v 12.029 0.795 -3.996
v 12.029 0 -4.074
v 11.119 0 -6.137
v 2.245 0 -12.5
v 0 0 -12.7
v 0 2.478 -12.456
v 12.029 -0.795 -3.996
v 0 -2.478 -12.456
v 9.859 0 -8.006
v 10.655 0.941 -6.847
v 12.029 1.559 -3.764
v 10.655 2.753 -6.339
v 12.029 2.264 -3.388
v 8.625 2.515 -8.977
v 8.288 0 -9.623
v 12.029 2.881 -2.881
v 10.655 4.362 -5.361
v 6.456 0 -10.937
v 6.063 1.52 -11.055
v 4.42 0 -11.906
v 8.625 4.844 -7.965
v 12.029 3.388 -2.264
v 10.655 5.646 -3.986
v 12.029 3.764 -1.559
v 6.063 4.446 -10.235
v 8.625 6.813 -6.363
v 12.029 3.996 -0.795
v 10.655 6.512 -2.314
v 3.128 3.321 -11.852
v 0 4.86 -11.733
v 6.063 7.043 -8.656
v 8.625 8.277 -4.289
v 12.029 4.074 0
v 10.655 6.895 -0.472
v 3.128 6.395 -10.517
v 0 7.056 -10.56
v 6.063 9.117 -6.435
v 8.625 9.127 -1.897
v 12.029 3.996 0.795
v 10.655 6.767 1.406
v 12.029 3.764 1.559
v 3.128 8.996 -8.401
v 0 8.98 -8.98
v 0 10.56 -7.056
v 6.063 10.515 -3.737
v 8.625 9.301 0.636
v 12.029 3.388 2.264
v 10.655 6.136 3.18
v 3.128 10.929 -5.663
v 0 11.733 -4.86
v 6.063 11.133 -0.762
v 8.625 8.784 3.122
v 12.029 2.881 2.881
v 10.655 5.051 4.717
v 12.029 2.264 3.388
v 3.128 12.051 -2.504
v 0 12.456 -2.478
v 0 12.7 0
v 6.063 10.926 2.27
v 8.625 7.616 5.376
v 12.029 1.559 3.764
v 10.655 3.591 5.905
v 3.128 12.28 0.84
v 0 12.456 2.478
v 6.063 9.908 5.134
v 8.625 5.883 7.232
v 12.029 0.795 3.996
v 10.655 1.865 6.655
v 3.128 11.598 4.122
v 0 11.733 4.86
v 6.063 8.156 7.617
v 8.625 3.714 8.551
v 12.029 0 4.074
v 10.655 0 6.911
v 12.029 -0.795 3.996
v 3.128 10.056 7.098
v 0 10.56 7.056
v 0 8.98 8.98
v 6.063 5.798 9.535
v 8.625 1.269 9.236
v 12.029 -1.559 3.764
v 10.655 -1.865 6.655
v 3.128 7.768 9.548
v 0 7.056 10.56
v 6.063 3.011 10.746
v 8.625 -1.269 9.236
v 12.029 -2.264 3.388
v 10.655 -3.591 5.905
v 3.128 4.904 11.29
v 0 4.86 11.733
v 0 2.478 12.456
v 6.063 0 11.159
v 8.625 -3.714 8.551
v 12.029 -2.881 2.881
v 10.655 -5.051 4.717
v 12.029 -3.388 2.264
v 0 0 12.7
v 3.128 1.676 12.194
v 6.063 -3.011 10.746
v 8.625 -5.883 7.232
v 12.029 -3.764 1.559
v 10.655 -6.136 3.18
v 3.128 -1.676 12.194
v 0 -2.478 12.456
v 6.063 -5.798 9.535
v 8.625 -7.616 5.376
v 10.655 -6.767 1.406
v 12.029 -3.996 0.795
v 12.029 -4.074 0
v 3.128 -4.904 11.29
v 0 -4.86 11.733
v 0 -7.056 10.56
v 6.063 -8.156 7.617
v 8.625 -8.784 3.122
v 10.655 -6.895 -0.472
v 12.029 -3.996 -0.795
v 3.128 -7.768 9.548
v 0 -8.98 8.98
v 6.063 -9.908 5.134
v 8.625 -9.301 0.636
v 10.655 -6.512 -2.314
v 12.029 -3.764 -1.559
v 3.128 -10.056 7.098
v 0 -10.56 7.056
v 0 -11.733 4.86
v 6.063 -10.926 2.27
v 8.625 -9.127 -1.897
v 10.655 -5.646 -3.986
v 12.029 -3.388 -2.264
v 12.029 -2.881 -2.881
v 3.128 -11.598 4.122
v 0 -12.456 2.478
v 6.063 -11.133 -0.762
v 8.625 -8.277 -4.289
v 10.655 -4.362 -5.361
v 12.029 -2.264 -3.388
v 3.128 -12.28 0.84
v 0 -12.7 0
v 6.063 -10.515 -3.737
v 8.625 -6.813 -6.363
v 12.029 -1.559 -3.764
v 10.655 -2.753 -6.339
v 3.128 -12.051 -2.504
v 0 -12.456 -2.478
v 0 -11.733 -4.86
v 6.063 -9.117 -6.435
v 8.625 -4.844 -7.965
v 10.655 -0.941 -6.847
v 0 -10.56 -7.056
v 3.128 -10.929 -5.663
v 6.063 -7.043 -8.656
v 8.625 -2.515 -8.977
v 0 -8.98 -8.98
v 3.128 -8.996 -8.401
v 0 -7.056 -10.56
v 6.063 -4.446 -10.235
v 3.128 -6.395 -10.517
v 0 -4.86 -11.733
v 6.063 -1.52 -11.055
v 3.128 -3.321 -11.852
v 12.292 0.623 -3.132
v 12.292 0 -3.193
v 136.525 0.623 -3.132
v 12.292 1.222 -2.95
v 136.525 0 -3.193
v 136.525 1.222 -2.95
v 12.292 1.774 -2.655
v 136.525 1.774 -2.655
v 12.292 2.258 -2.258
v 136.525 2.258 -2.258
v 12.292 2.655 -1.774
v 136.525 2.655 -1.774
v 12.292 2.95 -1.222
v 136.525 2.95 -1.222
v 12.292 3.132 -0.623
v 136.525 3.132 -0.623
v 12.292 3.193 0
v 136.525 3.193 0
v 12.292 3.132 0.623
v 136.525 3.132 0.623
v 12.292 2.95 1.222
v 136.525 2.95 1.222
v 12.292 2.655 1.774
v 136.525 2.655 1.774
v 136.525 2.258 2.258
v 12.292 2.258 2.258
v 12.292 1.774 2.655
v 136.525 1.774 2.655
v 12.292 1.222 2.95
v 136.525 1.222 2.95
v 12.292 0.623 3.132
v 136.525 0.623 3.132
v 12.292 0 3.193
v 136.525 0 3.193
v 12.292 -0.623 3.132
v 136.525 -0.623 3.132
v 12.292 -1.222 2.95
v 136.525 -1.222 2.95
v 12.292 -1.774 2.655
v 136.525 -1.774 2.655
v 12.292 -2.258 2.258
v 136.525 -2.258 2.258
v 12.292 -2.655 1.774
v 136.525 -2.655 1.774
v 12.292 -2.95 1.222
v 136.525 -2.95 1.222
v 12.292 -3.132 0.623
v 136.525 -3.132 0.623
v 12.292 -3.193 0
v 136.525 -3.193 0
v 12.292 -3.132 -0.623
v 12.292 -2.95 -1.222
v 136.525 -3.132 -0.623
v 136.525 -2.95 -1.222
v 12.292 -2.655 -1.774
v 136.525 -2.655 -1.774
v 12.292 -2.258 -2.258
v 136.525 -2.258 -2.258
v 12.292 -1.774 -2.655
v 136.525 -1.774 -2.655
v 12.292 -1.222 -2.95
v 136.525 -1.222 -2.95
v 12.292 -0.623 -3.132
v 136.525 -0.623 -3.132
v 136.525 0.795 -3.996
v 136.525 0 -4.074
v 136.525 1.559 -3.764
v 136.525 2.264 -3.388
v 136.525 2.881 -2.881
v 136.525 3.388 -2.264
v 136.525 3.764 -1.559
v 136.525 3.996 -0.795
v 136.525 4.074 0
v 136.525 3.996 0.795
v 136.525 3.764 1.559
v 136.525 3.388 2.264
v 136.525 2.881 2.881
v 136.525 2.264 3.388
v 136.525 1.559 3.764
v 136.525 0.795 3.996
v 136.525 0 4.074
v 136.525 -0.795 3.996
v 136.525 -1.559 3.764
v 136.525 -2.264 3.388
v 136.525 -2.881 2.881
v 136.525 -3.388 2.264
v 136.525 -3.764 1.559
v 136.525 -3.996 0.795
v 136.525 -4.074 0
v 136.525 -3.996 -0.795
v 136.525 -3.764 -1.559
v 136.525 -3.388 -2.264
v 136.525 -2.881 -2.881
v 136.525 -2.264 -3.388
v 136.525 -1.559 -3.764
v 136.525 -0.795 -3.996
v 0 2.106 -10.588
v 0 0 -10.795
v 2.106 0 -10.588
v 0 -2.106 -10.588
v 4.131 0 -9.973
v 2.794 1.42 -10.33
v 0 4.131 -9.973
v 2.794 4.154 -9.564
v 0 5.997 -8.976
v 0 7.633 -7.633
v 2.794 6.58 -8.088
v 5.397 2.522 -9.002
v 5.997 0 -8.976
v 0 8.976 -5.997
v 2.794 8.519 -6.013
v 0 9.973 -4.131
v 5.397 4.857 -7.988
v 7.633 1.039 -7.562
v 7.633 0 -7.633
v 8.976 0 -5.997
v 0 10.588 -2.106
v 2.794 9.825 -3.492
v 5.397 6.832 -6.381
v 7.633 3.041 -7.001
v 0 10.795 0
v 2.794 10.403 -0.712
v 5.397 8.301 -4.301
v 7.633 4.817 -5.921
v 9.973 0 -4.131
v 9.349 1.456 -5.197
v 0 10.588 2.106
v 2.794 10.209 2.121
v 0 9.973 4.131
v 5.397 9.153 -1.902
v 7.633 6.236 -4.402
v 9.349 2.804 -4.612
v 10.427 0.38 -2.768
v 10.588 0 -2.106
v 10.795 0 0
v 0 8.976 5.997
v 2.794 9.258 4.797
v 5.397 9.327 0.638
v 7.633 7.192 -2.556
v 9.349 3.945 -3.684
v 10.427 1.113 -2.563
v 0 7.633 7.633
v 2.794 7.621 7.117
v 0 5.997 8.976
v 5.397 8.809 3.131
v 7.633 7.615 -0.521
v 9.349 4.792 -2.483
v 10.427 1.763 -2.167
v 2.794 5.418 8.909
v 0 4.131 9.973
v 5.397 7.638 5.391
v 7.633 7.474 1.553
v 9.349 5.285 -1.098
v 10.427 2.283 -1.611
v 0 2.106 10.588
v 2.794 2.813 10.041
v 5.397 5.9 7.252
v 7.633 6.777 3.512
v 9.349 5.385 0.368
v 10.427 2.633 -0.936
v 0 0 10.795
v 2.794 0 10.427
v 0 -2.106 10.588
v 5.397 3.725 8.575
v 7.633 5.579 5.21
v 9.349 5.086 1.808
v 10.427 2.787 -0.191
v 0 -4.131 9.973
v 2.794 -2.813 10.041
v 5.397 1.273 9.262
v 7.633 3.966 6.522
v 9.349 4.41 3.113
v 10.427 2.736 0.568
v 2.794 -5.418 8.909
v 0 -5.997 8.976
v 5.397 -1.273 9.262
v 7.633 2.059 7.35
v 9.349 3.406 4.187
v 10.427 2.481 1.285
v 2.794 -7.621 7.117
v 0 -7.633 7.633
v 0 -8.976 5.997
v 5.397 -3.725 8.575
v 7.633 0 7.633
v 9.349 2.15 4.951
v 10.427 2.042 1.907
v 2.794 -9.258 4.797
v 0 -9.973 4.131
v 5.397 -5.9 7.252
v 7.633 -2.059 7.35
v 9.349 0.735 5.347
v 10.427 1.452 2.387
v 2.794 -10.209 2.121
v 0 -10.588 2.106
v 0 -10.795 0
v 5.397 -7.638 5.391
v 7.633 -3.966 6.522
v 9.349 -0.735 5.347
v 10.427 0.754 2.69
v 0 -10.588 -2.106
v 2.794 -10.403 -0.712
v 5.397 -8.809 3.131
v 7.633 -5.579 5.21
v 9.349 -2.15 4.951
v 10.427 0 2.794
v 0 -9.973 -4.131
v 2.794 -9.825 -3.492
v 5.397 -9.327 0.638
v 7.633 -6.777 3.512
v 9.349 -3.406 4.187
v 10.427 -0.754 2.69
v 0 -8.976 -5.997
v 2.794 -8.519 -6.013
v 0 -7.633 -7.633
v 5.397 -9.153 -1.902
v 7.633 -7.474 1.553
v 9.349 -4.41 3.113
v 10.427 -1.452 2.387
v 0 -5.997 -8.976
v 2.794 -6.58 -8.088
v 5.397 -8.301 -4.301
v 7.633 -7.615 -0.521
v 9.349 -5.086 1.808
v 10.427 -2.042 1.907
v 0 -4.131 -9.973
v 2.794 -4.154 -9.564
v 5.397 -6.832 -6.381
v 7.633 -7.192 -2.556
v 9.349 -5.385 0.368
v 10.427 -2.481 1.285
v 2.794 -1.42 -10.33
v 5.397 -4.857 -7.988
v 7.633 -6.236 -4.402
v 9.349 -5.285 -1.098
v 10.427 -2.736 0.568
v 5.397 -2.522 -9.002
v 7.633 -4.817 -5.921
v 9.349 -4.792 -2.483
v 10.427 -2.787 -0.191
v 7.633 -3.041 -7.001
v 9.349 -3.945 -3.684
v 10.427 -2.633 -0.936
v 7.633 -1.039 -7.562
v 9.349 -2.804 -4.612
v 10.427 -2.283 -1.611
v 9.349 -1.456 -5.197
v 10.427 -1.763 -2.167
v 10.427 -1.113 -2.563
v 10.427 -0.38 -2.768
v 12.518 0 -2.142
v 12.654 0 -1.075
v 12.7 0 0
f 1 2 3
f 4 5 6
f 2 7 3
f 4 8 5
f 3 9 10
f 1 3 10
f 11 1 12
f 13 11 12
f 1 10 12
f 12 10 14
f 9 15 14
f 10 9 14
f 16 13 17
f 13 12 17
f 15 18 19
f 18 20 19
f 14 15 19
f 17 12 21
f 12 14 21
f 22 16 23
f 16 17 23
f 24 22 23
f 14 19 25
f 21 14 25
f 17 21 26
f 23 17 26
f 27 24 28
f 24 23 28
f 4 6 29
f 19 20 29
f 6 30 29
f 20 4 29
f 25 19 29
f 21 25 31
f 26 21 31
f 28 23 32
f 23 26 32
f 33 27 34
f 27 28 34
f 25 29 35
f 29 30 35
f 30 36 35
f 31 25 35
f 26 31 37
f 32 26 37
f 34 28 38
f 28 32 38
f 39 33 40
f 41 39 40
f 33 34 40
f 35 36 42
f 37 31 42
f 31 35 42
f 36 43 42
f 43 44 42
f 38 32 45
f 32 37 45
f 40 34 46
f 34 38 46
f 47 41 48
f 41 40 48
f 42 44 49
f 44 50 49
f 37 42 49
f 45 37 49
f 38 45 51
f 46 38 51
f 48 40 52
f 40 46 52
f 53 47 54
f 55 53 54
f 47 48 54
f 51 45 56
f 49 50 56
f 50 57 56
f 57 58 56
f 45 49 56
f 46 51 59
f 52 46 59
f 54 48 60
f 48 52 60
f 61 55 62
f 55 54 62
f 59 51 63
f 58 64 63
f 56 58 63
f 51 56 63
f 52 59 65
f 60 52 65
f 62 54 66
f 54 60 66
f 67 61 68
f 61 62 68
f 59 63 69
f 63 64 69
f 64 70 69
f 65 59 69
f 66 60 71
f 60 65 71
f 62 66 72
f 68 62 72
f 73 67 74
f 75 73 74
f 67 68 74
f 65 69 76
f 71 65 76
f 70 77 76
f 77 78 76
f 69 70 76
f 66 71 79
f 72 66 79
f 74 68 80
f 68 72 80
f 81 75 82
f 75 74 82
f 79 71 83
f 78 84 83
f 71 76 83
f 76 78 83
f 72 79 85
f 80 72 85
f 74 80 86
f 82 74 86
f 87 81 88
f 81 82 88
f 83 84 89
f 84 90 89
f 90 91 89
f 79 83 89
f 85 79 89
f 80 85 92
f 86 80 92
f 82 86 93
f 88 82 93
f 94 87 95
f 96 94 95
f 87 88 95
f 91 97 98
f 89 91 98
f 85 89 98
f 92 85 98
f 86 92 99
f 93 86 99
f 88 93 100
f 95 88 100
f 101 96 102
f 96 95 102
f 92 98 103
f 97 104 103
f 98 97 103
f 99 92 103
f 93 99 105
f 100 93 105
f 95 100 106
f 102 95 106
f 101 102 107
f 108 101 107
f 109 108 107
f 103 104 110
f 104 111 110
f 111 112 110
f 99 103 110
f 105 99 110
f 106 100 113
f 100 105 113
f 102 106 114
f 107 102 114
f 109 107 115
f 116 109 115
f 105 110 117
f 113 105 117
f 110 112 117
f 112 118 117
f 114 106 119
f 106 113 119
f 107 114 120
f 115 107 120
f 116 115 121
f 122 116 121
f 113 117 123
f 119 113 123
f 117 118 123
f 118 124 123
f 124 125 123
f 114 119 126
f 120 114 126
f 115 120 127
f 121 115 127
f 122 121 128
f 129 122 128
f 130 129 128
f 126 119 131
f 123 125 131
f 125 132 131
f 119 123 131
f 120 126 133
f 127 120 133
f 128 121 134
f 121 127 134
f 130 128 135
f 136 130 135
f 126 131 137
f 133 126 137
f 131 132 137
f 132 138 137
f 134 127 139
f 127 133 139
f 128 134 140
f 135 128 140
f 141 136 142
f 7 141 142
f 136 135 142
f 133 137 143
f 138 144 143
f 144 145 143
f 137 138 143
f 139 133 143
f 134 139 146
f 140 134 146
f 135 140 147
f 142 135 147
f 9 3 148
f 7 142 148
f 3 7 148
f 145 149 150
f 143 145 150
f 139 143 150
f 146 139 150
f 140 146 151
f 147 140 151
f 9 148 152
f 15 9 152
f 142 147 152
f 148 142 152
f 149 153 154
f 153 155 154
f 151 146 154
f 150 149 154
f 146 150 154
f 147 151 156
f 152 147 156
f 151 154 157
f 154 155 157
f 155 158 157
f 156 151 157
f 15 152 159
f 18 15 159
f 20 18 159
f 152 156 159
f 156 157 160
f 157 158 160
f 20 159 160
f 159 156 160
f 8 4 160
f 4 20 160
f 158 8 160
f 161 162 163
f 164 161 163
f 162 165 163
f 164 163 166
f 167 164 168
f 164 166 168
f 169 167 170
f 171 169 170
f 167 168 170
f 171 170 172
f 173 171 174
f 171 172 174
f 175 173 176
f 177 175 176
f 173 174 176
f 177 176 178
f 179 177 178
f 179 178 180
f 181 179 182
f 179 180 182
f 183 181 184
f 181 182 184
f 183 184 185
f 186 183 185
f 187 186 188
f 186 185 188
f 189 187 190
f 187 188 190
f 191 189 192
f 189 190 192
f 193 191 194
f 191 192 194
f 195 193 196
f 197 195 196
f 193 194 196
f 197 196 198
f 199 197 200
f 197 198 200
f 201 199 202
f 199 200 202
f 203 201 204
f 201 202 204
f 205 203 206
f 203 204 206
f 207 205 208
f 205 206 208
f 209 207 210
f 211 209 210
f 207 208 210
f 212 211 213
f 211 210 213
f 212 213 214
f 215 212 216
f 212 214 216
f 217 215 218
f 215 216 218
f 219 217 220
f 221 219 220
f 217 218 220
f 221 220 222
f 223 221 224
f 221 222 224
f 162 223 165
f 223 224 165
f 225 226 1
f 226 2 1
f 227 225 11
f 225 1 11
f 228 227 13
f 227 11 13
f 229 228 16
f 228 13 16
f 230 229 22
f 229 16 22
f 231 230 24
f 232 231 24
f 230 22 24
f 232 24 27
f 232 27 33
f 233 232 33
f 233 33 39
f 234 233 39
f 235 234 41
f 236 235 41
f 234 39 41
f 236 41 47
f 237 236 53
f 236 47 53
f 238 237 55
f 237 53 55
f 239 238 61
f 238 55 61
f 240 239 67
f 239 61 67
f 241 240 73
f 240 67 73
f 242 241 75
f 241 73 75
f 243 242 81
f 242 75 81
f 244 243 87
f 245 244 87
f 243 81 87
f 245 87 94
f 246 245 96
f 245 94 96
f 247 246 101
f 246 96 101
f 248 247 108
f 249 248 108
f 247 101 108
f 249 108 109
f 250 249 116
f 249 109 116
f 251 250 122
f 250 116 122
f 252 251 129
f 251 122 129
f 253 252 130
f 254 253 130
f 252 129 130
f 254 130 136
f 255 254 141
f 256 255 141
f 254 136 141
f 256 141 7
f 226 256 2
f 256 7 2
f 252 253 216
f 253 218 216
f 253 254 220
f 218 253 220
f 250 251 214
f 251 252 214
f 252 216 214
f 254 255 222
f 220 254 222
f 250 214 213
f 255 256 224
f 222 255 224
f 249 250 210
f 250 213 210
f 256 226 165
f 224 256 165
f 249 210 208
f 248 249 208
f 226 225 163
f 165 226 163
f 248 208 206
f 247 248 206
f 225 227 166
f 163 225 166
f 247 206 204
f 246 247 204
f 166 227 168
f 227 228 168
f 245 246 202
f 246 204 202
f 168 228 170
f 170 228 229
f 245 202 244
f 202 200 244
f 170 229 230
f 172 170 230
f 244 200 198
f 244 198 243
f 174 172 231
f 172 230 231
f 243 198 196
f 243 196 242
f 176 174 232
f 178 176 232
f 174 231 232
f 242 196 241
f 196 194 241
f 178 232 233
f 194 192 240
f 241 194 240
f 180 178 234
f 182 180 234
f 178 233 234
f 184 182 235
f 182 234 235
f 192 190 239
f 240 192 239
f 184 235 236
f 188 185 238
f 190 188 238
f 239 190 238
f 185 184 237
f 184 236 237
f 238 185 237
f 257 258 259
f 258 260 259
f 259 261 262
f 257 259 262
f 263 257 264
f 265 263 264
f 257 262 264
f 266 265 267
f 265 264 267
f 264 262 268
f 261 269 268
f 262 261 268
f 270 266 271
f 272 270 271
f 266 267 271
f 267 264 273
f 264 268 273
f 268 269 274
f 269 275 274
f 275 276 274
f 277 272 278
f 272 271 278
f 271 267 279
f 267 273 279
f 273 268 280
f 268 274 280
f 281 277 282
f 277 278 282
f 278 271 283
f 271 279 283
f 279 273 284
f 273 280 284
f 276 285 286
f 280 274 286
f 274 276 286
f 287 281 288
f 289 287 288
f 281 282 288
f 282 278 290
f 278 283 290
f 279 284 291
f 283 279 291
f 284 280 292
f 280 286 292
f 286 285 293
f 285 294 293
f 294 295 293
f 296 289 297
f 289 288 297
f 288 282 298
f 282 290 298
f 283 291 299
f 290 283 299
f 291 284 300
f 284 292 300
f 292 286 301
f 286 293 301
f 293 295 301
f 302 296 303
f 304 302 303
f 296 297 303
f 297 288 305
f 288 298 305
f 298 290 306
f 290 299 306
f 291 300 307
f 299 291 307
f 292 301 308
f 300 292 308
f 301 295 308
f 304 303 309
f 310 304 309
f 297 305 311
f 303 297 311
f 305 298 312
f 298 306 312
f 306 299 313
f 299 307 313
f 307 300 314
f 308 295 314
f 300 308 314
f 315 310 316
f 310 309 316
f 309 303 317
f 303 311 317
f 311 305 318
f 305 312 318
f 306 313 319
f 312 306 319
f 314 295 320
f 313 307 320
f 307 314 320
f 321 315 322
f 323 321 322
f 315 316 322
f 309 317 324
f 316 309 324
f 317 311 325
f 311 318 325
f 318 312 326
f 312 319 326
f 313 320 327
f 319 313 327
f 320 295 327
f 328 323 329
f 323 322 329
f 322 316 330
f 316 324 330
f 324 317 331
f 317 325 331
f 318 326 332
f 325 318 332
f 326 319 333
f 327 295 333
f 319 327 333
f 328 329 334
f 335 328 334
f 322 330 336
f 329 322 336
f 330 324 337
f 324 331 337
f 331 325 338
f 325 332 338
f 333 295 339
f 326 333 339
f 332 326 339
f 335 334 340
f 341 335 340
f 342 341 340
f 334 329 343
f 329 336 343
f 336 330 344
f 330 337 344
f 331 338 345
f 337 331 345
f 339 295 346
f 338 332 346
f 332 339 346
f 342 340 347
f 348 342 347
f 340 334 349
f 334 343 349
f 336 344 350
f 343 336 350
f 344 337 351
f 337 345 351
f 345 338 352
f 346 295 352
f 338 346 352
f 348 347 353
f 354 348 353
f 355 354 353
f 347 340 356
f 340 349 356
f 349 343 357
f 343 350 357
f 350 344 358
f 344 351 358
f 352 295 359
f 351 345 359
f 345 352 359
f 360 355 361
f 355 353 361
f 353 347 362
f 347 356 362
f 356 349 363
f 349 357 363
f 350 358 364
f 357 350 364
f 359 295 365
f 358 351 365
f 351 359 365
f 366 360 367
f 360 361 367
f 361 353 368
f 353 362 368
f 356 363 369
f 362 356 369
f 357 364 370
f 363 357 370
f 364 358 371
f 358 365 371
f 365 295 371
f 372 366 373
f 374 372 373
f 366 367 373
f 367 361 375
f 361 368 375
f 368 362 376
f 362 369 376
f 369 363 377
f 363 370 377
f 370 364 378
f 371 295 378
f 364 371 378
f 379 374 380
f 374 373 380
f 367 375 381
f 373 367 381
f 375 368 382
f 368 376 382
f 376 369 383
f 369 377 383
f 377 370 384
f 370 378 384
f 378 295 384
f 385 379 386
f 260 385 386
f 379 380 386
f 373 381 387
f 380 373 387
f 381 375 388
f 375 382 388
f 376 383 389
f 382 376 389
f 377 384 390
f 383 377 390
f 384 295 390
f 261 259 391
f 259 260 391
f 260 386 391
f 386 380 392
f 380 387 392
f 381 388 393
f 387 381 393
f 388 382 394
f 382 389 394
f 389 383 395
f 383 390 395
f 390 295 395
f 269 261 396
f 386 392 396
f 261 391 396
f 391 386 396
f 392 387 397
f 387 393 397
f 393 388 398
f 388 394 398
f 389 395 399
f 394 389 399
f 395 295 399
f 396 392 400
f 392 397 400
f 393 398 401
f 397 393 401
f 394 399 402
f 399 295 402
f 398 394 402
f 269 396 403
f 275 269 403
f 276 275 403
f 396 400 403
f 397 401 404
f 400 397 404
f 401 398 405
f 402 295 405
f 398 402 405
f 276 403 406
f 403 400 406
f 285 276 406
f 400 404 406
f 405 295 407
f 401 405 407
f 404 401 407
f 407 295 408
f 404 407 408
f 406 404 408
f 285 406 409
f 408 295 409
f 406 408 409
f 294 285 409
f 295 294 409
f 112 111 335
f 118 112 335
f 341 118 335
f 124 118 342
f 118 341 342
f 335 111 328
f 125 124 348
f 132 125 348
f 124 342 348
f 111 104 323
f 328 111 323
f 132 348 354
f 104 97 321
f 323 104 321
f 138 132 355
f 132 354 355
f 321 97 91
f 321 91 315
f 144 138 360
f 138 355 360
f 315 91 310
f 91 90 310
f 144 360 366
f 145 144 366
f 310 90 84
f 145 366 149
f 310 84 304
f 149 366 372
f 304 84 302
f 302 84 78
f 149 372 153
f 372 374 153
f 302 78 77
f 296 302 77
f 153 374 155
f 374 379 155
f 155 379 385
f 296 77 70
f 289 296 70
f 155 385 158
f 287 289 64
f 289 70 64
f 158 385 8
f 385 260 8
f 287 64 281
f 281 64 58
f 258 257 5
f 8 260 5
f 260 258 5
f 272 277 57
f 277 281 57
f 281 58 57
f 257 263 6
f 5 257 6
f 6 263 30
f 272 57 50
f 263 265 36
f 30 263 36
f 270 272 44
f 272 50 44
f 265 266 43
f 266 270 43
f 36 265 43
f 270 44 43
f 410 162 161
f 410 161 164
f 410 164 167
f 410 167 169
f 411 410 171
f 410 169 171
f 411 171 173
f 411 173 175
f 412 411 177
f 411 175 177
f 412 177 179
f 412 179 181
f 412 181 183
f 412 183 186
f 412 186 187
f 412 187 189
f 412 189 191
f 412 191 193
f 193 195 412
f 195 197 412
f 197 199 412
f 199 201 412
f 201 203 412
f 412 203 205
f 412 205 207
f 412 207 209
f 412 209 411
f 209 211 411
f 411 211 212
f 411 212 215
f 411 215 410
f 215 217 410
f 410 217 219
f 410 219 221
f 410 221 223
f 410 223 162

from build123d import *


with BuildPart() as part:
    # Sketch1 → Revolve1 (revolve)
    with BuildSketch(Plane(origin=(0, 0, 0), x_dir=(1, 0, 0), z_dir=(0, 1, 0))):
        with BuildLine():
            Line((0, 12.7), (0, 10.795))
            ThreePointArc((0, 10.795), (7.633217703, 7.633217703), (10.795, 0))
            Line((10.795, 0), (12.7, 0))
            ThreePointArc((12.7, 0), (12.597580707, 1.609646024), (12.291974752, 3.193330031))
            Line((12.291974752, 3.193330031), (136.525, 3.193330031))
            Line((136.525, 3.193330031), (136.525, 4.074251535))
            Line((136.525, 4.074251535), (12.028735363, 4.074251535))
            ThreePointArc((12.028735363, 4.074251535), (7.400912292, 10.320682983), (0, 12.7))
        make_face()
    revolve(axis=Axis((0, 0, 0), (1, 0, 0)))


solid = part.part
